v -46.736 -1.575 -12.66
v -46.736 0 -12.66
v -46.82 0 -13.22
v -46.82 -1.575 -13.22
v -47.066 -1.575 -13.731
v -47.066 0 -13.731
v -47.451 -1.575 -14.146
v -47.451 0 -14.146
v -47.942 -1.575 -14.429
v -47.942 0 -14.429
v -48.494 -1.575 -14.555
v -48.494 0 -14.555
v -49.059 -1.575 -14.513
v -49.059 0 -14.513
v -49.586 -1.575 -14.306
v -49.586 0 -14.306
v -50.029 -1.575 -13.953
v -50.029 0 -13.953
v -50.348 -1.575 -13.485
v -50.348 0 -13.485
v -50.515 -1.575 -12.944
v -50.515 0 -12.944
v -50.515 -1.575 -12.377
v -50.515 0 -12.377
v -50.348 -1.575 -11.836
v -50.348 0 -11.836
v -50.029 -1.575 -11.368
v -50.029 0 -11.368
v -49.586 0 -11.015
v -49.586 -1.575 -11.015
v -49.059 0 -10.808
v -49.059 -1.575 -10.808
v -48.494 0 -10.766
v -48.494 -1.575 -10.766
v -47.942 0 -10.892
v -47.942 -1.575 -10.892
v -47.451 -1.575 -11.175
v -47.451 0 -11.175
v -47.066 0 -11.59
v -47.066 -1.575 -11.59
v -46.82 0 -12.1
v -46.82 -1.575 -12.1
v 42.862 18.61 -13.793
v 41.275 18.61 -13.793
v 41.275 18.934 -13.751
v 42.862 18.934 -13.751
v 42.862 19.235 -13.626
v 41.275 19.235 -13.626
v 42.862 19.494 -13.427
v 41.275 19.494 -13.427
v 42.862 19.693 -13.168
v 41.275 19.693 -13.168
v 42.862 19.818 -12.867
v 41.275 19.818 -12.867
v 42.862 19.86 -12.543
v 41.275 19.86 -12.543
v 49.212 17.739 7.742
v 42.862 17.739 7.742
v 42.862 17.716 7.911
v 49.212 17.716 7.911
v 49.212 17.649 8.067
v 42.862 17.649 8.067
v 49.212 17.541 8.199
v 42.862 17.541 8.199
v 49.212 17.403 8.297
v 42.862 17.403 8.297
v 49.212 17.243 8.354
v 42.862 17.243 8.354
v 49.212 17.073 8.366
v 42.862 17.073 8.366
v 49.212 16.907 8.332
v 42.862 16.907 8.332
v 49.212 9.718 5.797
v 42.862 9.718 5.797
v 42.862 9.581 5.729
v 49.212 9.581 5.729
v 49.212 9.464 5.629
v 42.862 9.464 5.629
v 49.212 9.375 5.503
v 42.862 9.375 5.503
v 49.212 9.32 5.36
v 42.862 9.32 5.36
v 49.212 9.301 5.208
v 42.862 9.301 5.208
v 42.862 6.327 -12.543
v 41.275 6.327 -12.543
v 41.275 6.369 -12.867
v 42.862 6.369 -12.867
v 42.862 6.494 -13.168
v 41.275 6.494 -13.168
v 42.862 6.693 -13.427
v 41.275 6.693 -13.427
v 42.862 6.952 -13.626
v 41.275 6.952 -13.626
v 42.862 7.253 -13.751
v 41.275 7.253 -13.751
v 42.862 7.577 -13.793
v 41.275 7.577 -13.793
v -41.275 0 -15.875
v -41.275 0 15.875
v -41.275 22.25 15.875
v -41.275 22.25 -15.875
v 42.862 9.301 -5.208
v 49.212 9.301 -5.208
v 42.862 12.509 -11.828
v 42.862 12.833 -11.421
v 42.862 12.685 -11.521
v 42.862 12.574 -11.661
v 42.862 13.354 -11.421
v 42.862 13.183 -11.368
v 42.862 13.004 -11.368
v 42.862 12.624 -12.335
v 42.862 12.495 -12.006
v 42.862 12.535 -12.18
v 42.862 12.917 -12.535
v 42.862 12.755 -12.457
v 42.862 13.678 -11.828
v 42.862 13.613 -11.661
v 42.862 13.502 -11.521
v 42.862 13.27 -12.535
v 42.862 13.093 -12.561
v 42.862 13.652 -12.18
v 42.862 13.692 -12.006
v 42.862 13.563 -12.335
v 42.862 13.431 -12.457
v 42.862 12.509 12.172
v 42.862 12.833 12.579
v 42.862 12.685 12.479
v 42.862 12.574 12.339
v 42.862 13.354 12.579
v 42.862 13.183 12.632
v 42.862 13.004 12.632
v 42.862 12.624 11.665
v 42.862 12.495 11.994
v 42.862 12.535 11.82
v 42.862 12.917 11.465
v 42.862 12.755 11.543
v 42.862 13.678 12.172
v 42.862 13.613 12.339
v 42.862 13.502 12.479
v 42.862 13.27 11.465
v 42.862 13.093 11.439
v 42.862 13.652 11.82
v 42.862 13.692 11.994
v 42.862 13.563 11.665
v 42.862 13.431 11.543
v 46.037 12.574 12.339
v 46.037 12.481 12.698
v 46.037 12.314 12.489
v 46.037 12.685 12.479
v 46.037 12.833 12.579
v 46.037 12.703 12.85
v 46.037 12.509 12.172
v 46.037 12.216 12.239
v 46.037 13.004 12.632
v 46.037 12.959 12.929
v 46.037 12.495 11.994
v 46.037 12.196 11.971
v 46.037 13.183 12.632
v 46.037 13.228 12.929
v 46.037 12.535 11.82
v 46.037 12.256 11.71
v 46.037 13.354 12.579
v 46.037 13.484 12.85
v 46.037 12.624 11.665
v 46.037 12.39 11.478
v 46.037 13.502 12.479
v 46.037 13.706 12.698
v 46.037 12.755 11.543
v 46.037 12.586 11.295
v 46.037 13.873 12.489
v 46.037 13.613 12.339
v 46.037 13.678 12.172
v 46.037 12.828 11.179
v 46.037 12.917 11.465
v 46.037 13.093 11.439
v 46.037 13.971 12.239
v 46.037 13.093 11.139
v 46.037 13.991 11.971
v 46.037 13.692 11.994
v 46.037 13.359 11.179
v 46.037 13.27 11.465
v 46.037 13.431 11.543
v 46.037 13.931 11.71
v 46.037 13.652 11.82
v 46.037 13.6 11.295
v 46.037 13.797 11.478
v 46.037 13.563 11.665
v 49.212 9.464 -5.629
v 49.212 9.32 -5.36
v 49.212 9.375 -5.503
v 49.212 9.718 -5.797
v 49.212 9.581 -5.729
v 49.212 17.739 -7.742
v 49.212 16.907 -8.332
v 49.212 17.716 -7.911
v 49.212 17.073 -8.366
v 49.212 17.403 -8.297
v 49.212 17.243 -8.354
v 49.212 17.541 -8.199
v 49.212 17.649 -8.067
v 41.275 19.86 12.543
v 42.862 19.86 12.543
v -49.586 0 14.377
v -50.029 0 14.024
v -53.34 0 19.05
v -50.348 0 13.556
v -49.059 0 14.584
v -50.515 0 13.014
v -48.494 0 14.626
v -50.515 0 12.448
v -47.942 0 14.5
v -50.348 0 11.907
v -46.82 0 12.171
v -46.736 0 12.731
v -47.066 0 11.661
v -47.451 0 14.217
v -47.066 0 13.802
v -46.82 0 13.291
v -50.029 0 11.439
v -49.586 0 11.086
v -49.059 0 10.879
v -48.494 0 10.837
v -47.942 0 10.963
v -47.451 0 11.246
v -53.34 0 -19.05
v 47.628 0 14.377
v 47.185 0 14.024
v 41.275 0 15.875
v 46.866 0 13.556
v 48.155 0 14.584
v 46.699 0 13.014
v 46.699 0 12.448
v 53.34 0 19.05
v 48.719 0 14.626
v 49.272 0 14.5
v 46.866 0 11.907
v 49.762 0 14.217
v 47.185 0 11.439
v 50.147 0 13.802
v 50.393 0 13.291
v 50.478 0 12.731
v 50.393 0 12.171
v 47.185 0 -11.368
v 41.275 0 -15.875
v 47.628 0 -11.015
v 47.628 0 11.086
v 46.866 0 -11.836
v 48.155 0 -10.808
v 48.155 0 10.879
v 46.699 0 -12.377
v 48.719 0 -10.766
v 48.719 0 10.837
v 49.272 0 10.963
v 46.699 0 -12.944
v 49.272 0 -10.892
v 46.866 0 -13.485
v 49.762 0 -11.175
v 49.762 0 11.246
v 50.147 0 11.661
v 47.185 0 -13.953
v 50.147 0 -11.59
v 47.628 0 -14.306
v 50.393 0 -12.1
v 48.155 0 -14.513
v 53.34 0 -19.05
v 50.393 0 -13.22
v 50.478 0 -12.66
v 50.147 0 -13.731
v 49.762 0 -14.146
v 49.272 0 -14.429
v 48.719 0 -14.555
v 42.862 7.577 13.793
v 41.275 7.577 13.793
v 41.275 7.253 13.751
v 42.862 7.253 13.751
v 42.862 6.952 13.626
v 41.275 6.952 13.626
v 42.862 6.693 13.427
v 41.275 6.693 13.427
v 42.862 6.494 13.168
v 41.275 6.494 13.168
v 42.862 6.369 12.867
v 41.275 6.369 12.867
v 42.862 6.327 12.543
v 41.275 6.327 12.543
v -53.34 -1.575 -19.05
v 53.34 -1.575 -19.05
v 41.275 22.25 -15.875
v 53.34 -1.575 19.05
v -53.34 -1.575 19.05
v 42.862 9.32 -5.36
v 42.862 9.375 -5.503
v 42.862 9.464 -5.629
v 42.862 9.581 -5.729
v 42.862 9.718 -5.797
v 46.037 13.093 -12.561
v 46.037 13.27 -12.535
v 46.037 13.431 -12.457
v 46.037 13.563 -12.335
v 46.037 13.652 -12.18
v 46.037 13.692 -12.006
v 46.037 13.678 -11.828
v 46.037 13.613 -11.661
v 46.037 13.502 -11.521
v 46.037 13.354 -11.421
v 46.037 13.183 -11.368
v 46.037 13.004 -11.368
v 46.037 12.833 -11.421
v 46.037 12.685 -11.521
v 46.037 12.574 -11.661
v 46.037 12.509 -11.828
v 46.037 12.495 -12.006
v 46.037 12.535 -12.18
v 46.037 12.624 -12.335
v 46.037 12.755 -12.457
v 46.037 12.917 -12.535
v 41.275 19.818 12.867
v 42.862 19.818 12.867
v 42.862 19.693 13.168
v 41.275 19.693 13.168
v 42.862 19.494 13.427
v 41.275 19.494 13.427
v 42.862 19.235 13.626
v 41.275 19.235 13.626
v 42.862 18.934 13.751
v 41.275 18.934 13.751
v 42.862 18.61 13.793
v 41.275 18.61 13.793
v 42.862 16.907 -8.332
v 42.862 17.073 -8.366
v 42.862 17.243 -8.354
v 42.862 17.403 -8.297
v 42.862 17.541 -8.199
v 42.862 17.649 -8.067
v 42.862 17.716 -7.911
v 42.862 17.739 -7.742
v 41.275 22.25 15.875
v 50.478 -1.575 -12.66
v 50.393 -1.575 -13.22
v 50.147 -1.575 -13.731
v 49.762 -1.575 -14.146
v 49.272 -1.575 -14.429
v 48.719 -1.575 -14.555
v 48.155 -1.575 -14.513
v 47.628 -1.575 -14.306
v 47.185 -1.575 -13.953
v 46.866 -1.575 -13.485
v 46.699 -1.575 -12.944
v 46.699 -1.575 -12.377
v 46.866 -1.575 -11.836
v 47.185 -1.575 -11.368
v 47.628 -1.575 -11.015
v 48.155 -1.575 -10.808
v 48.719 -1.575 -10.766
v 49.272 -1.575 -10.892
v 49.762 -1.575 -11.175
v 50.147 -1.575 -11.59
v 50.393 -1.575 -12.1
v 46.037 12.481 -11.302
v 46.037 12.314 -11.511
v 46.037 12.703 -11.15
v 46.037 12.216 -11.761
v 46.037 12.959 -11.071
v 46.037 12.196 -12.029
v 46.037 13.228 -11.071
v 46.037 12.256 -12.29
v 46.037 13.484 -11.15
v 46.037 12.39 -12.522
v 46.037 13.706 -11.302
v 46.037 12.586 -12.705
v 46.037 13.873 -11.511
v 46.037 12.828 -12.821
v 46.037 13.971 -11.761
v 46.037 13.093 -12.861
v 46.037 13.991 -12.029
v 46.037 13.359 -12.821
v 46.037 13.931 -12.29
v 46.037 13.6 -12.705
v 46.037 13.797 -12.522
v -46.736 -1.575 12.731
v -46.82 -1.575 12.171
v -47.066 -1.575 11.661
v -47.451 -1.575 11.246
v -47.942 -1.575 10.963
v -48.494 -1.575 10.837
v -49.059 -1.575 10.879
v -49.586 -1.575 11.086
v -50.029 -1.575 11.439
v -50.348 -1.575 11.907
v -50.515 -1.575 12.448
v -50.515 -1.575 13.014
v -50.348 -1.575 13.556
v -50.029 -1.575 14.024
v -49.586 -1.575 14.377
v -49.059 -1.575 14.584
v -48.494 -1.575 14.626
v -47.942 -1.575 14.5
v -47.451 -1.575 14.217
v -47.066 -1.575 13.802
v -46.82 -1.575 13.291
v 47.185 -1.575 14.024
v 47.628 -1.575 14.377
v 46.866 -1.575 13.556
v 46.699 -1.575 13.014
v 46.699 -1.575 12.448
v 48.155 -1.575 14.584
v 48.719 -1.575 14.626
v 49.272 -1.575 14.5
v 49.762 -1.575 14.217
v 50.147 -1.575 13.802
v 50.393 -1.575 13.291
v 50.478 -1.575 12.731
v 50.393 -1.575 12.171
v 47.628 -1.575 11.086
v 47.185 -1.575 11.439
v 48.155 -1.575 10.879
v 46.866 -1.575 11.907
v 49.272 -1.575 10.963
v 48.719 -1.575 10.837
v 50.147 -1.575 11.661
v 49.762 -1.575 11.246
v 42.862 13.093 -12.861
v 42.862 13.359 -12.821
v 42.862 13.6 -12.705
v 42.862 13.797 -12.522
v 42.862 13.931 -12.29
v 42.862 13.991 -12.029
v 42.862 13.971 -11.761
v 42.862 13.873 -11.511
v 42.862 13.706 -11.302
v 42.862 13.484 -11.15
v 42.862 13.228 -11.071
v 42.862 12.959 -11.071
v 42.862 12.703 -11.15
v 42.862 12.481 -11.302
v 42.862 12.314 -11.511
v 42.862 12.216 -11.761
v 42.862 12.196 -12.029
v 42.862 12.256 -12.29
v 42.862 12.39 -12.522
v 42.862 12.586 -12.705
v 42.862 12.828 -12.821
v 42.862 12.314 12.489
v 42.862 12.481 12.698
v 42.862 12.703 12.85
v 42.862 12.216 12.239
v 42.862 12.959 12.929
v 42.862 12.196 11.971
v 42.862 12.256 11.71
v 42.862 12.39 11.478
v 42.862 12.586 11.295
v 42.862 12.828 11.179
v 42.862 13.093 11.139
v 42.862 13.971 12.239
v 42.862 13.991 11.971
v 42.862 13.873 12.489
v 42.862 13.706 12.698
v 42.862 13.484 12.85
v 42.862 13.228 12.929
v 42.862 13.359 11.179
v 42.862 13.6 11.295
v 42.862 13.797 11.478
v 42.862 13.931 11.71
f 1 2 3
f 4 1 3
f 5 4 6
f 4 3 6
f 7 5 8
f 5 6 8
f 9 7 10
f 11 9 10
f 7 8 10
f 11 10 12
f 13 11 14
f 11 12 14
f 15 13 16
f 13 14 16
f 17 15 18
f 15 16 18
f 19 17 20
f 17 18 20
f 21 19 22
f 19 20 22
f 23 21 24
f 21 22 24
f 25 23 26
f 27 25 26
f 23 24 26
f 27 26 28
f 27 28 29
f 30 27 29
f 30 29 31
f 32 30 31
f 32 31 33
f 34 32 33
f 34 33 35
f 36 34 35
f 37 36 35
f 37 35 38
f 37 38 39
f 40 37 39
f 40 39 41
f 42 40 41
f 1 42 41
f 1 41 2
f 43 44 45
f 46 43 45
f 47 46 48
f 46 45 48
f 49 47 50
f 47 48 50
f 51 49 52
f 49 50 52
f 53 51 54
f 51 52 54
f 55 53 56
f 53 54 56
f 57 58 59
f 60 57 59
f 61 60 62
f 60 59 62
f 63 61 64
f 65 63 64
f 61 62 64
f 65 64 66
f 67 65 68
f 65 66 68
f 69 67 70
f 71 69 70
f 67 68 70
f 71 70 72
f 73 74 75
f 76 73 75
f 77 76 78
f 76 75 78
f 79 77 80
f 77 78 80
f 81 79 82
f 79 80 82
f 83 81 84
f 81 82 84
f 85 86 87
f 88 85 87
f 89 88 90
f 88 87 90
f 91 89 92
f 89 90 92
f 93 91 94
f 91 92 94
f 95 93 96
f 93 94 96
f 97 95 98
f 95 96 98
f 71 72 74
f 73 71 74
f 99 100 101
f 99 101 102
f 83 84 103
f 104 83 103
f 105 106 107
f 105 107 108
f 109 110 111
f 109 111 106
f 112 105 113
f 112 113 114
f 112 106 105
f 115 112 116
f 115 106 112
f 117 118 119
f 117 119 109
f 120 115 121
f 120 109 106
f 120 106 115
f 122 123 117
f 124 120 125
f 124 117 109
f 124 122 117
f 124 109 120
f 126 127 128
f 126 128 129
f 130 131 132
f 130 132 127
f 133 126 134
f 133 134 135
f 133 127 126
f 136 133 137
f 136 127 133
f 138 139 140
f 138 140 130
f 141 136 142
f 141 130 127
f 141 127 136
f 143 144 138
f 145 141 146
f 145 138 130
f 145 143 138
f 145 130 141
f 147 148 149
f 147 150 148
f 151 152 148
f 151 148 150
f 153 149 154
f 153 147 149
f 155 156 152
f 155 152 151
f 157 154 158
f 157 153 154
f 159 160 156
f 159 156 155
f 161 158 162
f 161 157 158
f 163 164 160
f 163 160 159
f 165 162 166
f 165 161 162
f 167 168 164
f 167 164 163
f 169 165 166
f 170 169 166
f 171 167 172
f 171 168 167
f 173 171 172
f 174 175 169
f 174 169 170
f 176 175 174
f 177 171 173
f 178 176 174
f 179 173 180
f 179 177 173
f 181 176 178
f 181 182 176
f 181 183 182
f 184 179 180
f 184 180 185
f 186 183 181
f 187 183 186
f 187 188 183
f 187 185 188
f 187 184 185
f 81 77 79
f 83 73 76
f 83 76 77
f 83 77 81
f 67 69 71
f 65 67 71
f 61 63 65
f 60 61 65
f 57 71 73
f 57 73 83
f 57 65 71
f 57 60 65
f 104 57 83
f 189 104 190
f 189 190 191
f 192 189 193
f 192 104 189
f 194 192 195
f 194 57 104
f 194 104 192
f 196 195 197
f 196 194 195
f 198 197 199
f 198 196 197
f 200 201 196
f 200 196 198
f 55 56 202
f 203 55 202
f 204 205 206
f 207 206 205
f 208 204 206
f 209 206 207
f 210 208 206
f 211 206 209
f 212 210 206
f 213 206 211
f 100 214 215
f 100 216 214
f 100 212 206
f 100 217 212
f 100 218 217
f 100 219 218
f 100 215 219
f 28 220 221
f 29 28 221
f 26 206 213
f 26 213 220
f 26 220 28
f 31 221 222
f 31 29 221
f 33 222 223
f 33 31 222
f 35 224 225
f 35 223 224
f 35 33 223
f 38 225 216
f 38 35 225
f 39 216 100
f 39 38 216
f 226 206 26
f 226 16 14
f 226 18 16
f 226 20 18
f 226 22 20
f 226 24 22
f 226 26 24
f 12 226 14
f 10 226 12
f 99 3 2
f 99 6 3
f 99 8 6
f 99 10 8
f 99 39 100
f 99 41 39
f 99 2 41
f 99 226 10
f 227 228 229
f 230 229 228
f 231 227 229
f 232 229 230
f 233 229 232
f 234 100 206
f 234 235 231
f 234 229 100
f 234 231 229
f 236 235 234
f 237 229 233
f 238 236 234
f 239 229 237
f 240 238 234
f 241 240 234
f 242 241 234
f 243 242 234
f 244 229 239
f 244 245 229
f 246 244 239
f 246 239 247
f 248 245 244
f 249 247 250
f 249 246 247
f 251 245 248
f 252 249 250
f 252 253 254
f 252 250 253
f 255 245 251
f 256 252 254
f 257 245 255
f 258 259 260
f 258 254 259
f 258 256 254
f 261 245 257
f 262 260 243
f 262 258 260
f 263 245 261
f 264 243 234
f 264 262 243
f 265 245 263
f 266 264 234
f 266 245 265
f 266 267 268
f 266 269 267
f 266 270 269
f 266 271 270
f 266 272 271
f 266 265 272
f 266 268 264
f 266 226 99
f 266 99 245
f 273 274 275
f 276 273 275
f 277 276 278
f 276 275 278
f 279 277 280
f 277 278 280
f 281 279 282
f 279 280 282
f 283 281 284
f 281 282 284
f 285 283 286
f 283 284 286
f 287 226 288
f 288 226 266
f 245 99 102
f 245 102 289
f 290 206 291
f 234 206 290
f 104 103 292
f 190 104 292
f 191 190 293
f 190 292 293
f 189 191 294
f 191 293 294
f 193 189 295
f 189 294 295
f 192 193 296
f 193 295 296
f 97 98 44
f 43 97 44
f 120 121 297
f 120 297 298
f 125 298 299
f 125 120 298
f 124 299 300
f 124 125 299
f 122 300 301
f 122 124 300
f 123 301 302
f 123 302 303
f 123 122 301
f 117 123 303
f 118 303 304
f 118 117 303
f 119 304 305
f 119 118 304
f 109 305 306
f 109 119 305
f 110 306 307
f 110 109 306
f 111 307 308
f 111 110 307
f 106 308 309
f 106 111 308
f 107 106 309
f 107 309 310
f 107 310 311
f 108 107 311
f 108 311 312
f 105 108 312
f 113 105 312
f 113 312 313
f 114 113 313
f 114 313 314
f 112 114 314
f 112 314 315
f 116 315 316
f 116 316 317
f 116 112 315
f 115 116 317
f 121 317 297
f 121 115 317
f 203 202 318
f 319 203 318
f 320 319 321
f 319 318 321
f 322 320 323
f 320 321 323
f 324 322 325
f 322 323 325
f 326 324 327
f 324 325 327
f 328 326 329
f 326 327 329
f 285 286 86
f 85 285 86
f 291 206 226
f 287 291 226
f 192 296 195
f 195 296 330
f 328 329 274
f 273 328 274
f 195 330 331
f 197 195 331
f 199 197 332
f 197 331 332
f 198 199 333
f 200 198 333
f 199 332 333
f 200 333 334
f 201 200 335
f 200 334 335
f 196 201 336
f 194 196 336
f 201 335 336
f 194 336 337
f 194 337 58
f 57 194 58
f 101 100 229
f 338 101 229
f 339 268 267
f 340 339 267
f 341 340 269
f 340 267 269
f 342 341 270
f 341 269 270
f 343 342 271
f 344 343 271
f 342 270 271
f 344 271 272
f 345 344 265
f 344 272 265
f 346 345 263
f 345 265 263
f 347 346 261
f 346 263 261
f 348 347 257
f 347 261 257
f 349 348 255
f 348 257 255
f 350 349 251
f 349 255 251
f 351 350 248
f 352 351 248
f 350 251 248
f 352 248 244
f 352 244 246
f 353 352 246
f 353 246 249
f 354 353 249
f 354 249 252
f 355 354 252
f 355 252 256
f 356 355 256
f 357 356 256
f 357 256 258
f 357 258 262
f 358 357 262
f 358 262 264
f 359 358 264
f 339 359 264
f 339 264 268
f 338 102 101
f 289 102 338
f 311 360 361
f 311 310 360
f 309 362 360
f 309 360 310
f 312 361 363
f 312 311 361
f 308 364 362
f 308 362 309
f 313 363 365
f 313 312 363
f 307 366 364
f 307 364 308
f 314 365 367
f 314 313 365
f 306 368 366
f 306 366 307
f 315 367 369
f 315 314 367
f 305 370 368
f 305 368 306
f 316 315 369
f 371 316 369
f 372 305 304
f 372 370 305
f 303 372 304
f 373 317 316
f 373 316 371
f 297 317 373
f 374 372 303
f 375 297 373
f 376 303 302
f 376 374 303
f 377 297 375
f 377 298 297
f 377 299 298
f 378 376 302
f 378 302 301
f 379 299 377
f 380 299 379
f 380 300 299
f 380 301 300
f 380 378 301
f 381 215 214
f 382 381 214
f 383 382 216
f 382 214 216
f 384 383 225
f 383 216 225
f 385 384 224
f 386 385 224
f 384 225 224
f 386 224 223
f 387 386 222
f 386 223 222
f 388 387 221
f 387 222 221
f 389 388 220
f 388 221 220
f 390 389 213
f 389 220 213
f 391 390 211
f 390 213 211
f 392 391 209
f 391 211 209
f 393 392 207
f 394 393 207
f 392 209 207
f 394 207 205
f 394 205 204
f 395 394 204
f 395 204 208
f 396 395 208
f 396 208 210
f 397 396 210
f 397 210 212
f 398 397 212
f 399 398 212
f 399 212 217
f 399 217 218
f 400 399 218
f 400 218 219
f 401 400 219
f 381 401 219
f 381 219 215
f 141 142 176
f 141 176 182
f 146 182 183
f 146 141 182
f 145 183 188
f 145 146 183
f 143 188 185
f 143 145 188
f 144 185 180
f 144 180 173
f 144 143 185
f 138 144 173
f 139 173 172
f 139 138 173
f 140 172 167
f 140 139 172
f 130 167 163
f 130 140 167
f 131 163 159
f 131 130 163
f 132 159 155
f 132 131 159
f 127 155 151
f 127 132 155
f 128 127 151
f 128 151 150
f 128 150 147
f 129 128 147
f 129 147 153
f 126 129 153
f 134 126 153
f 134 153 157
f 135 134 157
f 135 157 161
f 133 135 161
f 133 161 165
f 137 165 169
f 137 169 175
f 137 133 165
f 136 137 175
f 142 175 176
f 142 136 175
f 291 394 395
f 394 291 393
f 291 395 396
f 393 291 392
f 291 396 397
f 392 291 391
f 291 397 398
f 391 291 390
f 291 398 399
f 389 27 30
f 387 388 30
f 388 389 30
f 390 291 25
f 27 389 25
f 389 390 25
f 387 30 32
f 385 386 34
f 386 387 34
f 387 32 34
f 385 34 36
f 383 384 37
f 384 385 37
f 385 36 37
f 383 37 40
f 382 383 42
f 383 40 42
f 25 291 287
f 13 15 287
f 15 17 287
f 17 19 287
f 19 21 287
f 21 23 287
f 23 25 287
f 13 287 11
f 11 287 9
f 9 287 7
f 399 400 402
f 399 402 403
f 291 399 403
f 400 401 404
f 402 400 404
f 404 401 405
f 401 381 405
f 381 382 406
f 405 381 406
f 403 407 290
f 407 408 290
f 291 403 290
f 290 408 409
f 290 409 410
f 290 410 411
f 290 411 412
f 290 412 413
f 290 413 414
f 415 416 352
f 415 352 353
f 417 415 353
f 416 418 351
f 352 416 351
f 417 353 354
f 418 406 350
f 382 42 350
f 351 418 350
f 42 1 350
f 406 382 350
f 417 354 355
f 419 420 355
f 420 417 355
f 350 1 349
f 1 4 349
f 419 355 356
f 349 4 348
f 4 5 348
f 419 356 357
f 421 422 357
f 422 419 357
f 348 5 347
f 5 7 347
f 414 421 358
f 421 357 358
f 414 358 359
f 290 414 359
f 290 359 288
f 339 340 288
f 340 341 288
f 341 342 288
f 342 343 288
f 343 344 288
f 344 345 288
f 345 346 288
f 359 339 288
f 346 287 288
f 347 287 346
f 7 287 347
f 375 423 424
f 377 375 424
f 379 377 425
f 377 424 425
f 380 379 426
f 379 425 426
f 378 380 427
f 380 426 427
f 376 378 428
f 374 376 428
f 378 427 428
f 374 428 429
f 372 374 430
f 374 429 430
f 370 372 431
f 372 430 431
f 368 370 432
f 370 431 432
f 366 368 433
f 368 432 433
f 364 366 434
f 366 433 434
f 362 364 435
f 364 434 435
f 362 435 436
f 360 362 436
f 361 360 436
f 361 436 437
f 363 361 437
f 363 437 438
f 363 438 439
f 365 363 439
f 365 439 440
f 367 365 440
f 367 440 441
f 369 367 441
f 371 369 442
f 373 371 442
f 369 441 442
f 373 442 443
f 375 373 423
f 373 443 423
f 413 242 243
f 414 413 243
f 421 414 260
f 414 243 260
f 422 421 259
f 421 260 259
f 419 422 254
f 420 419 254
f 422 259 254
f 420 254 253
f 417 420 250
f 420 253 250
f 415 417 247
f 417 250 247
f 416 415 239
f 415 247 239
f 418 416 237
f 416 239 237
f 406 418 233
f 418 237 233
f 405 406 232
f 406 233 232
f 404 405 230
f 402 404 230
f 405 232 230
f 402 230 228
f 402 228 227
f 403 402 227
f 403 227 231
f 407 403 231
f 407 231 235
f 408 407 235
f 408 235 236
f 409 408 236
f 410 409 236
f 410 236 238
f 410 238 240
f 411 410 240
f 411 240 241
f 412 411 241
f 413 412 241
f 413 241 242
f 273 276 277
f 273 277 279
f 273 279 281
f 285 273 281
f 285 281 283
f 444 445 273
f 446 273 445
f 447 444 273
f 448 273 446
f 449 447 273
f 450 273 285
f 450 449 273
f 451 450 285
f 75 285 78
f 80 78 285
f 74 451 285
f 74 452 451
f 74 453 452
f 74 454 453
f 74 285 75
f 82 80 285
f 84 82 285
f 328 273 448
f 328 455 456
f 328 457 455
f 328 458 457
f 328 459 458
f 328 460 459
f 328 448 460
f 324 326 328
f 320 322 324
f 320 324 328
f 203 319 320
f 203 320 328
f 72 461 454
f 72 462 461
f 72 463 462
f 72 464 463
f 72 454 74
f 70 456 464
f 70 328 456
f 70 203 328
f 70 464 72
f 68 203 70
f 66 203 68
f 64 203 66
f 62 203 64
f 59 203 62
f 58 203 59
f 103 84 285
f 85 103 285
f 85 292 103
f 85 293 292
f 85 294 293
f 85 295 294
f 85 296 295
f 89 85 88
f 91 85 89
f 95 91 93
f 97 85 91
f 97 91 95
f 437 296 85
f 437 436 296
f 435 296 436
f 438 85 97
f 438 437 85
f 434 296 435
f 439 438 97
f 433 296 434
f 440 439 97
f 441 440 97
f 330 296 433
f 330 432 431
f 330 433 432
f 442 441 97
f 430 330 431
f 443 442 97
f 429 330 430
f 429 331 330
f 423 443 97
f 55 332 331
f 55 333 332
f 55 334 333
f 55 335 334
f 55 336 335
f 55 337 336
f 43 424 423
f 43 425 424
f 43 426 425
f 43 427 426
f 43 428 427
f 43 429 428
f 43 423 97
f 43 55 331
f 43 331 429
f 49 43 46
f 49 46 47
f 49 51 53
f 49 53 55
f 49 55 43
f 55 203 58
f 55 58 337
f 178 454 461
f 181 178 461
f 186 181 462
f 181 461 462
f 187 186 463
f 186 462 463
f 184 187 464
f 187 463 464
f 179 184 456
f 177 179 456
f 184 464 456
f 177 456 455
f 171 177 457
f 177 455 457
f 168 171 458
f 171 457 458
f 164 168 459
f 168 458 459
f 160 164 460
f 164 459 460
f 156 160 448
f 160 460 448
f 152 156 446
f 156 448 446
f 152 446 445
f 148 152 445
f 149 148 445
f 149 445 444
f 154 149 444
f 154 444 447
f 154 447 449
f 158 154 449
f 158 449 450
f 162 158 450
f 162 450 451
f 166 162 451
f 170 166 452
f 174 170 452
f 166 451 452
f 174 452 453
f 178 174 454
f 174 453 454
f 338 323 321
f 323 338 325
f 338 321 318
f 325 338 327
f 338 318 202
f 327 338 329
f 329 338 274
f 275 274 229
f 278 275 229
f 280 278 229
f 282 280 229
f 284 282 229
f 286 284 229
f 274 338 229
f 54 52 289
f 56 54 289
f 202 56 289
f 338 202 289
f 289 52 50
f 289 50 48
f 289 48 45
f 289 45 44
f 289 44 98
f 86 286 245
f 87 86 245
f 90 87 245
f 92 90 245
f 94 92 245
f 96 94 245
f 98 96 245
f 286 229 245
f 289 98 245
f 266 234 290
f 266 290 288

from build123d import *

# Parameters (mm, degrees)
SKETCH2_W           = 106.68
SKETCH2_H           = 38.1
BOSS_EXTRUDE1_DEPTH = 1.5748
SKETCH3_R           = 1.9
CUT_EXTRUDE1_DEPTH  = 2.5748
SKETCH4_W           = 82.55
SKETCH4_H           = 31.75
BOSS_EXTRUDE2_DEPTH = 22.2504
BOSS_EXTRUDE3_DEPTH = 1.5875
SKETCH7_R           = 0.9
SKETCH7_R_2         = 0.6
BOSS_EXTRUDE4_DEPTH = 3.175
BOSS_EXTRUDE5_DEPTH = 6.35


with BuildPart() as part:
    # Sketch2 → Boss-Extrude1 (new body)
    with BuildSketch(Plane(origin=(0, 0, 0), x_dir=(1, 0, 0), z_dir=(0, 1, 0))):
        Rectangle(SKETCH2_W, SKETCH2_H)
    extrude(amount=-BOSS_EXTRUDE1_DEPTH)

    # Sketch3 → Cut-Extrude1 (cut, through all)
    with BuildSketch(Plane(origin=(0, 0, 0), x_dir=(1, 0, 0), z_dir=(0, 1, 0))):
        with Locations((-48.635996958, 12.660327112)):
            Circle(SKETCH3_R)
        with Locations((-48.635996958, -12.731304513)):
            Circle(SKETCH3_R)
        with Locations((48.5775, 12.660327112)):
            Circle(SKETCH3_R)
        with Locations((48.5775, -12.731304513)):
            Circle(SKETCH3_R)
    extrude(amount=-CUT_EXTRUDE1_DEPTH, mode=Mode.SUBTRACT)

    # Sketch4 → Boss-Extrude2 (add)
    with BuildSketch(Plane(origin=(0, 0, 0), x_dir=(1, 0, 0), z_dir=(0, 1, 0))):
        Rectangle(SKETCH4_W, SKETCH4_H)
    extrude(amount=BOSS_EXTRUDE2_DEPTH)

    # Sketch5 → Boss-Extrude3 (add)
    with BuildSketch(Plane(origin=(41.275, 0, 0), x_dir=(0, 0, -1), z_dir=(1, 0, 0))):
        with BuildLine():
            Line((-12.543194793, 6.326748643), (12.543194793, 6.326748643))
            ThreePointArc((12.543194793, 6.326748643), (13.427078269, 6.692865167), (13.793194793, 7.576748643))
            Line((13.793194793, 7.576748643), (13.793194793, 18.610210685))
            ThreePointArc((13.793194793, 18.610210685), (13.427078269, 19.494094161), (12.543194793, 19.860210685))
            Line((12.543194793, 19.860210685), (-12.543194793, 19.860210685))
            ThreePointArc((-12.543194793, 19.860210685), (-13.427078269, 19.494094161), (-13.793194793, 18.610210685))
            Line((-13.793194793, 18.610210685), (-13.793194793, 7.576748643))
            ThreePointArc((-13.793194793, 7.576748643), (-13.427078269, 6.692865167), (-12.543194793, 6.326748643))
        make_face()
    extrude(amount=BOSS_EXTRUDE3_DEPTH)

    # Sketch7 → Boss-Extrude4 (add)
    with BuildSketch(Plane(origin=(42.8625, 0, 0), x_dir=(0, 0, -1), z_dir=(1, 0, 0))):
        with Locations((11.961268356, 13.093479664)):
            Circle(SKETCH7_R)
        with Locations((11.961268356, 13.093479664)):
            Circle(SKETCH7_R_2, mode=Mode.SUBTRACT)
        with Locations((-12.038731644, 13.093479664)):
            Circle(SKETCH7_R)
        with Locations((-12.038731644, 13.093479664)):
            Circle(SKETCH7_R_2, mode=Mode.SUBTRACT)
    extrude(amount=BOSS_EXTRUDE4_DEPTH)

    # Sketch8 → Boss-Extrude5 (add)
    with BuildSketch(Plane(origin=(42.8625, 0, 0), x_dir=(0, 0, -1), z_dir=(1, 0, 0))):
        with BuildLine():
            Line((-8.331799028, 16.906508091), (-5.797073634, 9.718080521))
            ThreePointArc((-5.797073634, 9.718080521), (-5.568701271, 9.415761232), (-5.207643796, 9.30092052))
            Line((-5.207643796, 9.30092052), (5.207643796, 9.30092052))
            ThreePointArc((5.207643796, 9.30092052), (5.568701271, 9.415761232), (5.797073634, 9.718080521))
            Line((5.797073634, 9.718080521), (8.331799028, 16.906508091))
            ThreePointArc((8.331799028, 16.906508091), (8.252528477, 17.475405565), (7.742369189, 17.73934809))
            Line((7.742369189, 17.73934809), (-7.742369189, 17.73934809))
            ThreePointArc((-7.742369189, 17.73934809), (-8.252528477, 17.475405565), (-8.331799028, 16.906508091))
        make_face()
    extrude(amount=BOSS_EXTRUDE5_DEPTH)


solid = part.part
